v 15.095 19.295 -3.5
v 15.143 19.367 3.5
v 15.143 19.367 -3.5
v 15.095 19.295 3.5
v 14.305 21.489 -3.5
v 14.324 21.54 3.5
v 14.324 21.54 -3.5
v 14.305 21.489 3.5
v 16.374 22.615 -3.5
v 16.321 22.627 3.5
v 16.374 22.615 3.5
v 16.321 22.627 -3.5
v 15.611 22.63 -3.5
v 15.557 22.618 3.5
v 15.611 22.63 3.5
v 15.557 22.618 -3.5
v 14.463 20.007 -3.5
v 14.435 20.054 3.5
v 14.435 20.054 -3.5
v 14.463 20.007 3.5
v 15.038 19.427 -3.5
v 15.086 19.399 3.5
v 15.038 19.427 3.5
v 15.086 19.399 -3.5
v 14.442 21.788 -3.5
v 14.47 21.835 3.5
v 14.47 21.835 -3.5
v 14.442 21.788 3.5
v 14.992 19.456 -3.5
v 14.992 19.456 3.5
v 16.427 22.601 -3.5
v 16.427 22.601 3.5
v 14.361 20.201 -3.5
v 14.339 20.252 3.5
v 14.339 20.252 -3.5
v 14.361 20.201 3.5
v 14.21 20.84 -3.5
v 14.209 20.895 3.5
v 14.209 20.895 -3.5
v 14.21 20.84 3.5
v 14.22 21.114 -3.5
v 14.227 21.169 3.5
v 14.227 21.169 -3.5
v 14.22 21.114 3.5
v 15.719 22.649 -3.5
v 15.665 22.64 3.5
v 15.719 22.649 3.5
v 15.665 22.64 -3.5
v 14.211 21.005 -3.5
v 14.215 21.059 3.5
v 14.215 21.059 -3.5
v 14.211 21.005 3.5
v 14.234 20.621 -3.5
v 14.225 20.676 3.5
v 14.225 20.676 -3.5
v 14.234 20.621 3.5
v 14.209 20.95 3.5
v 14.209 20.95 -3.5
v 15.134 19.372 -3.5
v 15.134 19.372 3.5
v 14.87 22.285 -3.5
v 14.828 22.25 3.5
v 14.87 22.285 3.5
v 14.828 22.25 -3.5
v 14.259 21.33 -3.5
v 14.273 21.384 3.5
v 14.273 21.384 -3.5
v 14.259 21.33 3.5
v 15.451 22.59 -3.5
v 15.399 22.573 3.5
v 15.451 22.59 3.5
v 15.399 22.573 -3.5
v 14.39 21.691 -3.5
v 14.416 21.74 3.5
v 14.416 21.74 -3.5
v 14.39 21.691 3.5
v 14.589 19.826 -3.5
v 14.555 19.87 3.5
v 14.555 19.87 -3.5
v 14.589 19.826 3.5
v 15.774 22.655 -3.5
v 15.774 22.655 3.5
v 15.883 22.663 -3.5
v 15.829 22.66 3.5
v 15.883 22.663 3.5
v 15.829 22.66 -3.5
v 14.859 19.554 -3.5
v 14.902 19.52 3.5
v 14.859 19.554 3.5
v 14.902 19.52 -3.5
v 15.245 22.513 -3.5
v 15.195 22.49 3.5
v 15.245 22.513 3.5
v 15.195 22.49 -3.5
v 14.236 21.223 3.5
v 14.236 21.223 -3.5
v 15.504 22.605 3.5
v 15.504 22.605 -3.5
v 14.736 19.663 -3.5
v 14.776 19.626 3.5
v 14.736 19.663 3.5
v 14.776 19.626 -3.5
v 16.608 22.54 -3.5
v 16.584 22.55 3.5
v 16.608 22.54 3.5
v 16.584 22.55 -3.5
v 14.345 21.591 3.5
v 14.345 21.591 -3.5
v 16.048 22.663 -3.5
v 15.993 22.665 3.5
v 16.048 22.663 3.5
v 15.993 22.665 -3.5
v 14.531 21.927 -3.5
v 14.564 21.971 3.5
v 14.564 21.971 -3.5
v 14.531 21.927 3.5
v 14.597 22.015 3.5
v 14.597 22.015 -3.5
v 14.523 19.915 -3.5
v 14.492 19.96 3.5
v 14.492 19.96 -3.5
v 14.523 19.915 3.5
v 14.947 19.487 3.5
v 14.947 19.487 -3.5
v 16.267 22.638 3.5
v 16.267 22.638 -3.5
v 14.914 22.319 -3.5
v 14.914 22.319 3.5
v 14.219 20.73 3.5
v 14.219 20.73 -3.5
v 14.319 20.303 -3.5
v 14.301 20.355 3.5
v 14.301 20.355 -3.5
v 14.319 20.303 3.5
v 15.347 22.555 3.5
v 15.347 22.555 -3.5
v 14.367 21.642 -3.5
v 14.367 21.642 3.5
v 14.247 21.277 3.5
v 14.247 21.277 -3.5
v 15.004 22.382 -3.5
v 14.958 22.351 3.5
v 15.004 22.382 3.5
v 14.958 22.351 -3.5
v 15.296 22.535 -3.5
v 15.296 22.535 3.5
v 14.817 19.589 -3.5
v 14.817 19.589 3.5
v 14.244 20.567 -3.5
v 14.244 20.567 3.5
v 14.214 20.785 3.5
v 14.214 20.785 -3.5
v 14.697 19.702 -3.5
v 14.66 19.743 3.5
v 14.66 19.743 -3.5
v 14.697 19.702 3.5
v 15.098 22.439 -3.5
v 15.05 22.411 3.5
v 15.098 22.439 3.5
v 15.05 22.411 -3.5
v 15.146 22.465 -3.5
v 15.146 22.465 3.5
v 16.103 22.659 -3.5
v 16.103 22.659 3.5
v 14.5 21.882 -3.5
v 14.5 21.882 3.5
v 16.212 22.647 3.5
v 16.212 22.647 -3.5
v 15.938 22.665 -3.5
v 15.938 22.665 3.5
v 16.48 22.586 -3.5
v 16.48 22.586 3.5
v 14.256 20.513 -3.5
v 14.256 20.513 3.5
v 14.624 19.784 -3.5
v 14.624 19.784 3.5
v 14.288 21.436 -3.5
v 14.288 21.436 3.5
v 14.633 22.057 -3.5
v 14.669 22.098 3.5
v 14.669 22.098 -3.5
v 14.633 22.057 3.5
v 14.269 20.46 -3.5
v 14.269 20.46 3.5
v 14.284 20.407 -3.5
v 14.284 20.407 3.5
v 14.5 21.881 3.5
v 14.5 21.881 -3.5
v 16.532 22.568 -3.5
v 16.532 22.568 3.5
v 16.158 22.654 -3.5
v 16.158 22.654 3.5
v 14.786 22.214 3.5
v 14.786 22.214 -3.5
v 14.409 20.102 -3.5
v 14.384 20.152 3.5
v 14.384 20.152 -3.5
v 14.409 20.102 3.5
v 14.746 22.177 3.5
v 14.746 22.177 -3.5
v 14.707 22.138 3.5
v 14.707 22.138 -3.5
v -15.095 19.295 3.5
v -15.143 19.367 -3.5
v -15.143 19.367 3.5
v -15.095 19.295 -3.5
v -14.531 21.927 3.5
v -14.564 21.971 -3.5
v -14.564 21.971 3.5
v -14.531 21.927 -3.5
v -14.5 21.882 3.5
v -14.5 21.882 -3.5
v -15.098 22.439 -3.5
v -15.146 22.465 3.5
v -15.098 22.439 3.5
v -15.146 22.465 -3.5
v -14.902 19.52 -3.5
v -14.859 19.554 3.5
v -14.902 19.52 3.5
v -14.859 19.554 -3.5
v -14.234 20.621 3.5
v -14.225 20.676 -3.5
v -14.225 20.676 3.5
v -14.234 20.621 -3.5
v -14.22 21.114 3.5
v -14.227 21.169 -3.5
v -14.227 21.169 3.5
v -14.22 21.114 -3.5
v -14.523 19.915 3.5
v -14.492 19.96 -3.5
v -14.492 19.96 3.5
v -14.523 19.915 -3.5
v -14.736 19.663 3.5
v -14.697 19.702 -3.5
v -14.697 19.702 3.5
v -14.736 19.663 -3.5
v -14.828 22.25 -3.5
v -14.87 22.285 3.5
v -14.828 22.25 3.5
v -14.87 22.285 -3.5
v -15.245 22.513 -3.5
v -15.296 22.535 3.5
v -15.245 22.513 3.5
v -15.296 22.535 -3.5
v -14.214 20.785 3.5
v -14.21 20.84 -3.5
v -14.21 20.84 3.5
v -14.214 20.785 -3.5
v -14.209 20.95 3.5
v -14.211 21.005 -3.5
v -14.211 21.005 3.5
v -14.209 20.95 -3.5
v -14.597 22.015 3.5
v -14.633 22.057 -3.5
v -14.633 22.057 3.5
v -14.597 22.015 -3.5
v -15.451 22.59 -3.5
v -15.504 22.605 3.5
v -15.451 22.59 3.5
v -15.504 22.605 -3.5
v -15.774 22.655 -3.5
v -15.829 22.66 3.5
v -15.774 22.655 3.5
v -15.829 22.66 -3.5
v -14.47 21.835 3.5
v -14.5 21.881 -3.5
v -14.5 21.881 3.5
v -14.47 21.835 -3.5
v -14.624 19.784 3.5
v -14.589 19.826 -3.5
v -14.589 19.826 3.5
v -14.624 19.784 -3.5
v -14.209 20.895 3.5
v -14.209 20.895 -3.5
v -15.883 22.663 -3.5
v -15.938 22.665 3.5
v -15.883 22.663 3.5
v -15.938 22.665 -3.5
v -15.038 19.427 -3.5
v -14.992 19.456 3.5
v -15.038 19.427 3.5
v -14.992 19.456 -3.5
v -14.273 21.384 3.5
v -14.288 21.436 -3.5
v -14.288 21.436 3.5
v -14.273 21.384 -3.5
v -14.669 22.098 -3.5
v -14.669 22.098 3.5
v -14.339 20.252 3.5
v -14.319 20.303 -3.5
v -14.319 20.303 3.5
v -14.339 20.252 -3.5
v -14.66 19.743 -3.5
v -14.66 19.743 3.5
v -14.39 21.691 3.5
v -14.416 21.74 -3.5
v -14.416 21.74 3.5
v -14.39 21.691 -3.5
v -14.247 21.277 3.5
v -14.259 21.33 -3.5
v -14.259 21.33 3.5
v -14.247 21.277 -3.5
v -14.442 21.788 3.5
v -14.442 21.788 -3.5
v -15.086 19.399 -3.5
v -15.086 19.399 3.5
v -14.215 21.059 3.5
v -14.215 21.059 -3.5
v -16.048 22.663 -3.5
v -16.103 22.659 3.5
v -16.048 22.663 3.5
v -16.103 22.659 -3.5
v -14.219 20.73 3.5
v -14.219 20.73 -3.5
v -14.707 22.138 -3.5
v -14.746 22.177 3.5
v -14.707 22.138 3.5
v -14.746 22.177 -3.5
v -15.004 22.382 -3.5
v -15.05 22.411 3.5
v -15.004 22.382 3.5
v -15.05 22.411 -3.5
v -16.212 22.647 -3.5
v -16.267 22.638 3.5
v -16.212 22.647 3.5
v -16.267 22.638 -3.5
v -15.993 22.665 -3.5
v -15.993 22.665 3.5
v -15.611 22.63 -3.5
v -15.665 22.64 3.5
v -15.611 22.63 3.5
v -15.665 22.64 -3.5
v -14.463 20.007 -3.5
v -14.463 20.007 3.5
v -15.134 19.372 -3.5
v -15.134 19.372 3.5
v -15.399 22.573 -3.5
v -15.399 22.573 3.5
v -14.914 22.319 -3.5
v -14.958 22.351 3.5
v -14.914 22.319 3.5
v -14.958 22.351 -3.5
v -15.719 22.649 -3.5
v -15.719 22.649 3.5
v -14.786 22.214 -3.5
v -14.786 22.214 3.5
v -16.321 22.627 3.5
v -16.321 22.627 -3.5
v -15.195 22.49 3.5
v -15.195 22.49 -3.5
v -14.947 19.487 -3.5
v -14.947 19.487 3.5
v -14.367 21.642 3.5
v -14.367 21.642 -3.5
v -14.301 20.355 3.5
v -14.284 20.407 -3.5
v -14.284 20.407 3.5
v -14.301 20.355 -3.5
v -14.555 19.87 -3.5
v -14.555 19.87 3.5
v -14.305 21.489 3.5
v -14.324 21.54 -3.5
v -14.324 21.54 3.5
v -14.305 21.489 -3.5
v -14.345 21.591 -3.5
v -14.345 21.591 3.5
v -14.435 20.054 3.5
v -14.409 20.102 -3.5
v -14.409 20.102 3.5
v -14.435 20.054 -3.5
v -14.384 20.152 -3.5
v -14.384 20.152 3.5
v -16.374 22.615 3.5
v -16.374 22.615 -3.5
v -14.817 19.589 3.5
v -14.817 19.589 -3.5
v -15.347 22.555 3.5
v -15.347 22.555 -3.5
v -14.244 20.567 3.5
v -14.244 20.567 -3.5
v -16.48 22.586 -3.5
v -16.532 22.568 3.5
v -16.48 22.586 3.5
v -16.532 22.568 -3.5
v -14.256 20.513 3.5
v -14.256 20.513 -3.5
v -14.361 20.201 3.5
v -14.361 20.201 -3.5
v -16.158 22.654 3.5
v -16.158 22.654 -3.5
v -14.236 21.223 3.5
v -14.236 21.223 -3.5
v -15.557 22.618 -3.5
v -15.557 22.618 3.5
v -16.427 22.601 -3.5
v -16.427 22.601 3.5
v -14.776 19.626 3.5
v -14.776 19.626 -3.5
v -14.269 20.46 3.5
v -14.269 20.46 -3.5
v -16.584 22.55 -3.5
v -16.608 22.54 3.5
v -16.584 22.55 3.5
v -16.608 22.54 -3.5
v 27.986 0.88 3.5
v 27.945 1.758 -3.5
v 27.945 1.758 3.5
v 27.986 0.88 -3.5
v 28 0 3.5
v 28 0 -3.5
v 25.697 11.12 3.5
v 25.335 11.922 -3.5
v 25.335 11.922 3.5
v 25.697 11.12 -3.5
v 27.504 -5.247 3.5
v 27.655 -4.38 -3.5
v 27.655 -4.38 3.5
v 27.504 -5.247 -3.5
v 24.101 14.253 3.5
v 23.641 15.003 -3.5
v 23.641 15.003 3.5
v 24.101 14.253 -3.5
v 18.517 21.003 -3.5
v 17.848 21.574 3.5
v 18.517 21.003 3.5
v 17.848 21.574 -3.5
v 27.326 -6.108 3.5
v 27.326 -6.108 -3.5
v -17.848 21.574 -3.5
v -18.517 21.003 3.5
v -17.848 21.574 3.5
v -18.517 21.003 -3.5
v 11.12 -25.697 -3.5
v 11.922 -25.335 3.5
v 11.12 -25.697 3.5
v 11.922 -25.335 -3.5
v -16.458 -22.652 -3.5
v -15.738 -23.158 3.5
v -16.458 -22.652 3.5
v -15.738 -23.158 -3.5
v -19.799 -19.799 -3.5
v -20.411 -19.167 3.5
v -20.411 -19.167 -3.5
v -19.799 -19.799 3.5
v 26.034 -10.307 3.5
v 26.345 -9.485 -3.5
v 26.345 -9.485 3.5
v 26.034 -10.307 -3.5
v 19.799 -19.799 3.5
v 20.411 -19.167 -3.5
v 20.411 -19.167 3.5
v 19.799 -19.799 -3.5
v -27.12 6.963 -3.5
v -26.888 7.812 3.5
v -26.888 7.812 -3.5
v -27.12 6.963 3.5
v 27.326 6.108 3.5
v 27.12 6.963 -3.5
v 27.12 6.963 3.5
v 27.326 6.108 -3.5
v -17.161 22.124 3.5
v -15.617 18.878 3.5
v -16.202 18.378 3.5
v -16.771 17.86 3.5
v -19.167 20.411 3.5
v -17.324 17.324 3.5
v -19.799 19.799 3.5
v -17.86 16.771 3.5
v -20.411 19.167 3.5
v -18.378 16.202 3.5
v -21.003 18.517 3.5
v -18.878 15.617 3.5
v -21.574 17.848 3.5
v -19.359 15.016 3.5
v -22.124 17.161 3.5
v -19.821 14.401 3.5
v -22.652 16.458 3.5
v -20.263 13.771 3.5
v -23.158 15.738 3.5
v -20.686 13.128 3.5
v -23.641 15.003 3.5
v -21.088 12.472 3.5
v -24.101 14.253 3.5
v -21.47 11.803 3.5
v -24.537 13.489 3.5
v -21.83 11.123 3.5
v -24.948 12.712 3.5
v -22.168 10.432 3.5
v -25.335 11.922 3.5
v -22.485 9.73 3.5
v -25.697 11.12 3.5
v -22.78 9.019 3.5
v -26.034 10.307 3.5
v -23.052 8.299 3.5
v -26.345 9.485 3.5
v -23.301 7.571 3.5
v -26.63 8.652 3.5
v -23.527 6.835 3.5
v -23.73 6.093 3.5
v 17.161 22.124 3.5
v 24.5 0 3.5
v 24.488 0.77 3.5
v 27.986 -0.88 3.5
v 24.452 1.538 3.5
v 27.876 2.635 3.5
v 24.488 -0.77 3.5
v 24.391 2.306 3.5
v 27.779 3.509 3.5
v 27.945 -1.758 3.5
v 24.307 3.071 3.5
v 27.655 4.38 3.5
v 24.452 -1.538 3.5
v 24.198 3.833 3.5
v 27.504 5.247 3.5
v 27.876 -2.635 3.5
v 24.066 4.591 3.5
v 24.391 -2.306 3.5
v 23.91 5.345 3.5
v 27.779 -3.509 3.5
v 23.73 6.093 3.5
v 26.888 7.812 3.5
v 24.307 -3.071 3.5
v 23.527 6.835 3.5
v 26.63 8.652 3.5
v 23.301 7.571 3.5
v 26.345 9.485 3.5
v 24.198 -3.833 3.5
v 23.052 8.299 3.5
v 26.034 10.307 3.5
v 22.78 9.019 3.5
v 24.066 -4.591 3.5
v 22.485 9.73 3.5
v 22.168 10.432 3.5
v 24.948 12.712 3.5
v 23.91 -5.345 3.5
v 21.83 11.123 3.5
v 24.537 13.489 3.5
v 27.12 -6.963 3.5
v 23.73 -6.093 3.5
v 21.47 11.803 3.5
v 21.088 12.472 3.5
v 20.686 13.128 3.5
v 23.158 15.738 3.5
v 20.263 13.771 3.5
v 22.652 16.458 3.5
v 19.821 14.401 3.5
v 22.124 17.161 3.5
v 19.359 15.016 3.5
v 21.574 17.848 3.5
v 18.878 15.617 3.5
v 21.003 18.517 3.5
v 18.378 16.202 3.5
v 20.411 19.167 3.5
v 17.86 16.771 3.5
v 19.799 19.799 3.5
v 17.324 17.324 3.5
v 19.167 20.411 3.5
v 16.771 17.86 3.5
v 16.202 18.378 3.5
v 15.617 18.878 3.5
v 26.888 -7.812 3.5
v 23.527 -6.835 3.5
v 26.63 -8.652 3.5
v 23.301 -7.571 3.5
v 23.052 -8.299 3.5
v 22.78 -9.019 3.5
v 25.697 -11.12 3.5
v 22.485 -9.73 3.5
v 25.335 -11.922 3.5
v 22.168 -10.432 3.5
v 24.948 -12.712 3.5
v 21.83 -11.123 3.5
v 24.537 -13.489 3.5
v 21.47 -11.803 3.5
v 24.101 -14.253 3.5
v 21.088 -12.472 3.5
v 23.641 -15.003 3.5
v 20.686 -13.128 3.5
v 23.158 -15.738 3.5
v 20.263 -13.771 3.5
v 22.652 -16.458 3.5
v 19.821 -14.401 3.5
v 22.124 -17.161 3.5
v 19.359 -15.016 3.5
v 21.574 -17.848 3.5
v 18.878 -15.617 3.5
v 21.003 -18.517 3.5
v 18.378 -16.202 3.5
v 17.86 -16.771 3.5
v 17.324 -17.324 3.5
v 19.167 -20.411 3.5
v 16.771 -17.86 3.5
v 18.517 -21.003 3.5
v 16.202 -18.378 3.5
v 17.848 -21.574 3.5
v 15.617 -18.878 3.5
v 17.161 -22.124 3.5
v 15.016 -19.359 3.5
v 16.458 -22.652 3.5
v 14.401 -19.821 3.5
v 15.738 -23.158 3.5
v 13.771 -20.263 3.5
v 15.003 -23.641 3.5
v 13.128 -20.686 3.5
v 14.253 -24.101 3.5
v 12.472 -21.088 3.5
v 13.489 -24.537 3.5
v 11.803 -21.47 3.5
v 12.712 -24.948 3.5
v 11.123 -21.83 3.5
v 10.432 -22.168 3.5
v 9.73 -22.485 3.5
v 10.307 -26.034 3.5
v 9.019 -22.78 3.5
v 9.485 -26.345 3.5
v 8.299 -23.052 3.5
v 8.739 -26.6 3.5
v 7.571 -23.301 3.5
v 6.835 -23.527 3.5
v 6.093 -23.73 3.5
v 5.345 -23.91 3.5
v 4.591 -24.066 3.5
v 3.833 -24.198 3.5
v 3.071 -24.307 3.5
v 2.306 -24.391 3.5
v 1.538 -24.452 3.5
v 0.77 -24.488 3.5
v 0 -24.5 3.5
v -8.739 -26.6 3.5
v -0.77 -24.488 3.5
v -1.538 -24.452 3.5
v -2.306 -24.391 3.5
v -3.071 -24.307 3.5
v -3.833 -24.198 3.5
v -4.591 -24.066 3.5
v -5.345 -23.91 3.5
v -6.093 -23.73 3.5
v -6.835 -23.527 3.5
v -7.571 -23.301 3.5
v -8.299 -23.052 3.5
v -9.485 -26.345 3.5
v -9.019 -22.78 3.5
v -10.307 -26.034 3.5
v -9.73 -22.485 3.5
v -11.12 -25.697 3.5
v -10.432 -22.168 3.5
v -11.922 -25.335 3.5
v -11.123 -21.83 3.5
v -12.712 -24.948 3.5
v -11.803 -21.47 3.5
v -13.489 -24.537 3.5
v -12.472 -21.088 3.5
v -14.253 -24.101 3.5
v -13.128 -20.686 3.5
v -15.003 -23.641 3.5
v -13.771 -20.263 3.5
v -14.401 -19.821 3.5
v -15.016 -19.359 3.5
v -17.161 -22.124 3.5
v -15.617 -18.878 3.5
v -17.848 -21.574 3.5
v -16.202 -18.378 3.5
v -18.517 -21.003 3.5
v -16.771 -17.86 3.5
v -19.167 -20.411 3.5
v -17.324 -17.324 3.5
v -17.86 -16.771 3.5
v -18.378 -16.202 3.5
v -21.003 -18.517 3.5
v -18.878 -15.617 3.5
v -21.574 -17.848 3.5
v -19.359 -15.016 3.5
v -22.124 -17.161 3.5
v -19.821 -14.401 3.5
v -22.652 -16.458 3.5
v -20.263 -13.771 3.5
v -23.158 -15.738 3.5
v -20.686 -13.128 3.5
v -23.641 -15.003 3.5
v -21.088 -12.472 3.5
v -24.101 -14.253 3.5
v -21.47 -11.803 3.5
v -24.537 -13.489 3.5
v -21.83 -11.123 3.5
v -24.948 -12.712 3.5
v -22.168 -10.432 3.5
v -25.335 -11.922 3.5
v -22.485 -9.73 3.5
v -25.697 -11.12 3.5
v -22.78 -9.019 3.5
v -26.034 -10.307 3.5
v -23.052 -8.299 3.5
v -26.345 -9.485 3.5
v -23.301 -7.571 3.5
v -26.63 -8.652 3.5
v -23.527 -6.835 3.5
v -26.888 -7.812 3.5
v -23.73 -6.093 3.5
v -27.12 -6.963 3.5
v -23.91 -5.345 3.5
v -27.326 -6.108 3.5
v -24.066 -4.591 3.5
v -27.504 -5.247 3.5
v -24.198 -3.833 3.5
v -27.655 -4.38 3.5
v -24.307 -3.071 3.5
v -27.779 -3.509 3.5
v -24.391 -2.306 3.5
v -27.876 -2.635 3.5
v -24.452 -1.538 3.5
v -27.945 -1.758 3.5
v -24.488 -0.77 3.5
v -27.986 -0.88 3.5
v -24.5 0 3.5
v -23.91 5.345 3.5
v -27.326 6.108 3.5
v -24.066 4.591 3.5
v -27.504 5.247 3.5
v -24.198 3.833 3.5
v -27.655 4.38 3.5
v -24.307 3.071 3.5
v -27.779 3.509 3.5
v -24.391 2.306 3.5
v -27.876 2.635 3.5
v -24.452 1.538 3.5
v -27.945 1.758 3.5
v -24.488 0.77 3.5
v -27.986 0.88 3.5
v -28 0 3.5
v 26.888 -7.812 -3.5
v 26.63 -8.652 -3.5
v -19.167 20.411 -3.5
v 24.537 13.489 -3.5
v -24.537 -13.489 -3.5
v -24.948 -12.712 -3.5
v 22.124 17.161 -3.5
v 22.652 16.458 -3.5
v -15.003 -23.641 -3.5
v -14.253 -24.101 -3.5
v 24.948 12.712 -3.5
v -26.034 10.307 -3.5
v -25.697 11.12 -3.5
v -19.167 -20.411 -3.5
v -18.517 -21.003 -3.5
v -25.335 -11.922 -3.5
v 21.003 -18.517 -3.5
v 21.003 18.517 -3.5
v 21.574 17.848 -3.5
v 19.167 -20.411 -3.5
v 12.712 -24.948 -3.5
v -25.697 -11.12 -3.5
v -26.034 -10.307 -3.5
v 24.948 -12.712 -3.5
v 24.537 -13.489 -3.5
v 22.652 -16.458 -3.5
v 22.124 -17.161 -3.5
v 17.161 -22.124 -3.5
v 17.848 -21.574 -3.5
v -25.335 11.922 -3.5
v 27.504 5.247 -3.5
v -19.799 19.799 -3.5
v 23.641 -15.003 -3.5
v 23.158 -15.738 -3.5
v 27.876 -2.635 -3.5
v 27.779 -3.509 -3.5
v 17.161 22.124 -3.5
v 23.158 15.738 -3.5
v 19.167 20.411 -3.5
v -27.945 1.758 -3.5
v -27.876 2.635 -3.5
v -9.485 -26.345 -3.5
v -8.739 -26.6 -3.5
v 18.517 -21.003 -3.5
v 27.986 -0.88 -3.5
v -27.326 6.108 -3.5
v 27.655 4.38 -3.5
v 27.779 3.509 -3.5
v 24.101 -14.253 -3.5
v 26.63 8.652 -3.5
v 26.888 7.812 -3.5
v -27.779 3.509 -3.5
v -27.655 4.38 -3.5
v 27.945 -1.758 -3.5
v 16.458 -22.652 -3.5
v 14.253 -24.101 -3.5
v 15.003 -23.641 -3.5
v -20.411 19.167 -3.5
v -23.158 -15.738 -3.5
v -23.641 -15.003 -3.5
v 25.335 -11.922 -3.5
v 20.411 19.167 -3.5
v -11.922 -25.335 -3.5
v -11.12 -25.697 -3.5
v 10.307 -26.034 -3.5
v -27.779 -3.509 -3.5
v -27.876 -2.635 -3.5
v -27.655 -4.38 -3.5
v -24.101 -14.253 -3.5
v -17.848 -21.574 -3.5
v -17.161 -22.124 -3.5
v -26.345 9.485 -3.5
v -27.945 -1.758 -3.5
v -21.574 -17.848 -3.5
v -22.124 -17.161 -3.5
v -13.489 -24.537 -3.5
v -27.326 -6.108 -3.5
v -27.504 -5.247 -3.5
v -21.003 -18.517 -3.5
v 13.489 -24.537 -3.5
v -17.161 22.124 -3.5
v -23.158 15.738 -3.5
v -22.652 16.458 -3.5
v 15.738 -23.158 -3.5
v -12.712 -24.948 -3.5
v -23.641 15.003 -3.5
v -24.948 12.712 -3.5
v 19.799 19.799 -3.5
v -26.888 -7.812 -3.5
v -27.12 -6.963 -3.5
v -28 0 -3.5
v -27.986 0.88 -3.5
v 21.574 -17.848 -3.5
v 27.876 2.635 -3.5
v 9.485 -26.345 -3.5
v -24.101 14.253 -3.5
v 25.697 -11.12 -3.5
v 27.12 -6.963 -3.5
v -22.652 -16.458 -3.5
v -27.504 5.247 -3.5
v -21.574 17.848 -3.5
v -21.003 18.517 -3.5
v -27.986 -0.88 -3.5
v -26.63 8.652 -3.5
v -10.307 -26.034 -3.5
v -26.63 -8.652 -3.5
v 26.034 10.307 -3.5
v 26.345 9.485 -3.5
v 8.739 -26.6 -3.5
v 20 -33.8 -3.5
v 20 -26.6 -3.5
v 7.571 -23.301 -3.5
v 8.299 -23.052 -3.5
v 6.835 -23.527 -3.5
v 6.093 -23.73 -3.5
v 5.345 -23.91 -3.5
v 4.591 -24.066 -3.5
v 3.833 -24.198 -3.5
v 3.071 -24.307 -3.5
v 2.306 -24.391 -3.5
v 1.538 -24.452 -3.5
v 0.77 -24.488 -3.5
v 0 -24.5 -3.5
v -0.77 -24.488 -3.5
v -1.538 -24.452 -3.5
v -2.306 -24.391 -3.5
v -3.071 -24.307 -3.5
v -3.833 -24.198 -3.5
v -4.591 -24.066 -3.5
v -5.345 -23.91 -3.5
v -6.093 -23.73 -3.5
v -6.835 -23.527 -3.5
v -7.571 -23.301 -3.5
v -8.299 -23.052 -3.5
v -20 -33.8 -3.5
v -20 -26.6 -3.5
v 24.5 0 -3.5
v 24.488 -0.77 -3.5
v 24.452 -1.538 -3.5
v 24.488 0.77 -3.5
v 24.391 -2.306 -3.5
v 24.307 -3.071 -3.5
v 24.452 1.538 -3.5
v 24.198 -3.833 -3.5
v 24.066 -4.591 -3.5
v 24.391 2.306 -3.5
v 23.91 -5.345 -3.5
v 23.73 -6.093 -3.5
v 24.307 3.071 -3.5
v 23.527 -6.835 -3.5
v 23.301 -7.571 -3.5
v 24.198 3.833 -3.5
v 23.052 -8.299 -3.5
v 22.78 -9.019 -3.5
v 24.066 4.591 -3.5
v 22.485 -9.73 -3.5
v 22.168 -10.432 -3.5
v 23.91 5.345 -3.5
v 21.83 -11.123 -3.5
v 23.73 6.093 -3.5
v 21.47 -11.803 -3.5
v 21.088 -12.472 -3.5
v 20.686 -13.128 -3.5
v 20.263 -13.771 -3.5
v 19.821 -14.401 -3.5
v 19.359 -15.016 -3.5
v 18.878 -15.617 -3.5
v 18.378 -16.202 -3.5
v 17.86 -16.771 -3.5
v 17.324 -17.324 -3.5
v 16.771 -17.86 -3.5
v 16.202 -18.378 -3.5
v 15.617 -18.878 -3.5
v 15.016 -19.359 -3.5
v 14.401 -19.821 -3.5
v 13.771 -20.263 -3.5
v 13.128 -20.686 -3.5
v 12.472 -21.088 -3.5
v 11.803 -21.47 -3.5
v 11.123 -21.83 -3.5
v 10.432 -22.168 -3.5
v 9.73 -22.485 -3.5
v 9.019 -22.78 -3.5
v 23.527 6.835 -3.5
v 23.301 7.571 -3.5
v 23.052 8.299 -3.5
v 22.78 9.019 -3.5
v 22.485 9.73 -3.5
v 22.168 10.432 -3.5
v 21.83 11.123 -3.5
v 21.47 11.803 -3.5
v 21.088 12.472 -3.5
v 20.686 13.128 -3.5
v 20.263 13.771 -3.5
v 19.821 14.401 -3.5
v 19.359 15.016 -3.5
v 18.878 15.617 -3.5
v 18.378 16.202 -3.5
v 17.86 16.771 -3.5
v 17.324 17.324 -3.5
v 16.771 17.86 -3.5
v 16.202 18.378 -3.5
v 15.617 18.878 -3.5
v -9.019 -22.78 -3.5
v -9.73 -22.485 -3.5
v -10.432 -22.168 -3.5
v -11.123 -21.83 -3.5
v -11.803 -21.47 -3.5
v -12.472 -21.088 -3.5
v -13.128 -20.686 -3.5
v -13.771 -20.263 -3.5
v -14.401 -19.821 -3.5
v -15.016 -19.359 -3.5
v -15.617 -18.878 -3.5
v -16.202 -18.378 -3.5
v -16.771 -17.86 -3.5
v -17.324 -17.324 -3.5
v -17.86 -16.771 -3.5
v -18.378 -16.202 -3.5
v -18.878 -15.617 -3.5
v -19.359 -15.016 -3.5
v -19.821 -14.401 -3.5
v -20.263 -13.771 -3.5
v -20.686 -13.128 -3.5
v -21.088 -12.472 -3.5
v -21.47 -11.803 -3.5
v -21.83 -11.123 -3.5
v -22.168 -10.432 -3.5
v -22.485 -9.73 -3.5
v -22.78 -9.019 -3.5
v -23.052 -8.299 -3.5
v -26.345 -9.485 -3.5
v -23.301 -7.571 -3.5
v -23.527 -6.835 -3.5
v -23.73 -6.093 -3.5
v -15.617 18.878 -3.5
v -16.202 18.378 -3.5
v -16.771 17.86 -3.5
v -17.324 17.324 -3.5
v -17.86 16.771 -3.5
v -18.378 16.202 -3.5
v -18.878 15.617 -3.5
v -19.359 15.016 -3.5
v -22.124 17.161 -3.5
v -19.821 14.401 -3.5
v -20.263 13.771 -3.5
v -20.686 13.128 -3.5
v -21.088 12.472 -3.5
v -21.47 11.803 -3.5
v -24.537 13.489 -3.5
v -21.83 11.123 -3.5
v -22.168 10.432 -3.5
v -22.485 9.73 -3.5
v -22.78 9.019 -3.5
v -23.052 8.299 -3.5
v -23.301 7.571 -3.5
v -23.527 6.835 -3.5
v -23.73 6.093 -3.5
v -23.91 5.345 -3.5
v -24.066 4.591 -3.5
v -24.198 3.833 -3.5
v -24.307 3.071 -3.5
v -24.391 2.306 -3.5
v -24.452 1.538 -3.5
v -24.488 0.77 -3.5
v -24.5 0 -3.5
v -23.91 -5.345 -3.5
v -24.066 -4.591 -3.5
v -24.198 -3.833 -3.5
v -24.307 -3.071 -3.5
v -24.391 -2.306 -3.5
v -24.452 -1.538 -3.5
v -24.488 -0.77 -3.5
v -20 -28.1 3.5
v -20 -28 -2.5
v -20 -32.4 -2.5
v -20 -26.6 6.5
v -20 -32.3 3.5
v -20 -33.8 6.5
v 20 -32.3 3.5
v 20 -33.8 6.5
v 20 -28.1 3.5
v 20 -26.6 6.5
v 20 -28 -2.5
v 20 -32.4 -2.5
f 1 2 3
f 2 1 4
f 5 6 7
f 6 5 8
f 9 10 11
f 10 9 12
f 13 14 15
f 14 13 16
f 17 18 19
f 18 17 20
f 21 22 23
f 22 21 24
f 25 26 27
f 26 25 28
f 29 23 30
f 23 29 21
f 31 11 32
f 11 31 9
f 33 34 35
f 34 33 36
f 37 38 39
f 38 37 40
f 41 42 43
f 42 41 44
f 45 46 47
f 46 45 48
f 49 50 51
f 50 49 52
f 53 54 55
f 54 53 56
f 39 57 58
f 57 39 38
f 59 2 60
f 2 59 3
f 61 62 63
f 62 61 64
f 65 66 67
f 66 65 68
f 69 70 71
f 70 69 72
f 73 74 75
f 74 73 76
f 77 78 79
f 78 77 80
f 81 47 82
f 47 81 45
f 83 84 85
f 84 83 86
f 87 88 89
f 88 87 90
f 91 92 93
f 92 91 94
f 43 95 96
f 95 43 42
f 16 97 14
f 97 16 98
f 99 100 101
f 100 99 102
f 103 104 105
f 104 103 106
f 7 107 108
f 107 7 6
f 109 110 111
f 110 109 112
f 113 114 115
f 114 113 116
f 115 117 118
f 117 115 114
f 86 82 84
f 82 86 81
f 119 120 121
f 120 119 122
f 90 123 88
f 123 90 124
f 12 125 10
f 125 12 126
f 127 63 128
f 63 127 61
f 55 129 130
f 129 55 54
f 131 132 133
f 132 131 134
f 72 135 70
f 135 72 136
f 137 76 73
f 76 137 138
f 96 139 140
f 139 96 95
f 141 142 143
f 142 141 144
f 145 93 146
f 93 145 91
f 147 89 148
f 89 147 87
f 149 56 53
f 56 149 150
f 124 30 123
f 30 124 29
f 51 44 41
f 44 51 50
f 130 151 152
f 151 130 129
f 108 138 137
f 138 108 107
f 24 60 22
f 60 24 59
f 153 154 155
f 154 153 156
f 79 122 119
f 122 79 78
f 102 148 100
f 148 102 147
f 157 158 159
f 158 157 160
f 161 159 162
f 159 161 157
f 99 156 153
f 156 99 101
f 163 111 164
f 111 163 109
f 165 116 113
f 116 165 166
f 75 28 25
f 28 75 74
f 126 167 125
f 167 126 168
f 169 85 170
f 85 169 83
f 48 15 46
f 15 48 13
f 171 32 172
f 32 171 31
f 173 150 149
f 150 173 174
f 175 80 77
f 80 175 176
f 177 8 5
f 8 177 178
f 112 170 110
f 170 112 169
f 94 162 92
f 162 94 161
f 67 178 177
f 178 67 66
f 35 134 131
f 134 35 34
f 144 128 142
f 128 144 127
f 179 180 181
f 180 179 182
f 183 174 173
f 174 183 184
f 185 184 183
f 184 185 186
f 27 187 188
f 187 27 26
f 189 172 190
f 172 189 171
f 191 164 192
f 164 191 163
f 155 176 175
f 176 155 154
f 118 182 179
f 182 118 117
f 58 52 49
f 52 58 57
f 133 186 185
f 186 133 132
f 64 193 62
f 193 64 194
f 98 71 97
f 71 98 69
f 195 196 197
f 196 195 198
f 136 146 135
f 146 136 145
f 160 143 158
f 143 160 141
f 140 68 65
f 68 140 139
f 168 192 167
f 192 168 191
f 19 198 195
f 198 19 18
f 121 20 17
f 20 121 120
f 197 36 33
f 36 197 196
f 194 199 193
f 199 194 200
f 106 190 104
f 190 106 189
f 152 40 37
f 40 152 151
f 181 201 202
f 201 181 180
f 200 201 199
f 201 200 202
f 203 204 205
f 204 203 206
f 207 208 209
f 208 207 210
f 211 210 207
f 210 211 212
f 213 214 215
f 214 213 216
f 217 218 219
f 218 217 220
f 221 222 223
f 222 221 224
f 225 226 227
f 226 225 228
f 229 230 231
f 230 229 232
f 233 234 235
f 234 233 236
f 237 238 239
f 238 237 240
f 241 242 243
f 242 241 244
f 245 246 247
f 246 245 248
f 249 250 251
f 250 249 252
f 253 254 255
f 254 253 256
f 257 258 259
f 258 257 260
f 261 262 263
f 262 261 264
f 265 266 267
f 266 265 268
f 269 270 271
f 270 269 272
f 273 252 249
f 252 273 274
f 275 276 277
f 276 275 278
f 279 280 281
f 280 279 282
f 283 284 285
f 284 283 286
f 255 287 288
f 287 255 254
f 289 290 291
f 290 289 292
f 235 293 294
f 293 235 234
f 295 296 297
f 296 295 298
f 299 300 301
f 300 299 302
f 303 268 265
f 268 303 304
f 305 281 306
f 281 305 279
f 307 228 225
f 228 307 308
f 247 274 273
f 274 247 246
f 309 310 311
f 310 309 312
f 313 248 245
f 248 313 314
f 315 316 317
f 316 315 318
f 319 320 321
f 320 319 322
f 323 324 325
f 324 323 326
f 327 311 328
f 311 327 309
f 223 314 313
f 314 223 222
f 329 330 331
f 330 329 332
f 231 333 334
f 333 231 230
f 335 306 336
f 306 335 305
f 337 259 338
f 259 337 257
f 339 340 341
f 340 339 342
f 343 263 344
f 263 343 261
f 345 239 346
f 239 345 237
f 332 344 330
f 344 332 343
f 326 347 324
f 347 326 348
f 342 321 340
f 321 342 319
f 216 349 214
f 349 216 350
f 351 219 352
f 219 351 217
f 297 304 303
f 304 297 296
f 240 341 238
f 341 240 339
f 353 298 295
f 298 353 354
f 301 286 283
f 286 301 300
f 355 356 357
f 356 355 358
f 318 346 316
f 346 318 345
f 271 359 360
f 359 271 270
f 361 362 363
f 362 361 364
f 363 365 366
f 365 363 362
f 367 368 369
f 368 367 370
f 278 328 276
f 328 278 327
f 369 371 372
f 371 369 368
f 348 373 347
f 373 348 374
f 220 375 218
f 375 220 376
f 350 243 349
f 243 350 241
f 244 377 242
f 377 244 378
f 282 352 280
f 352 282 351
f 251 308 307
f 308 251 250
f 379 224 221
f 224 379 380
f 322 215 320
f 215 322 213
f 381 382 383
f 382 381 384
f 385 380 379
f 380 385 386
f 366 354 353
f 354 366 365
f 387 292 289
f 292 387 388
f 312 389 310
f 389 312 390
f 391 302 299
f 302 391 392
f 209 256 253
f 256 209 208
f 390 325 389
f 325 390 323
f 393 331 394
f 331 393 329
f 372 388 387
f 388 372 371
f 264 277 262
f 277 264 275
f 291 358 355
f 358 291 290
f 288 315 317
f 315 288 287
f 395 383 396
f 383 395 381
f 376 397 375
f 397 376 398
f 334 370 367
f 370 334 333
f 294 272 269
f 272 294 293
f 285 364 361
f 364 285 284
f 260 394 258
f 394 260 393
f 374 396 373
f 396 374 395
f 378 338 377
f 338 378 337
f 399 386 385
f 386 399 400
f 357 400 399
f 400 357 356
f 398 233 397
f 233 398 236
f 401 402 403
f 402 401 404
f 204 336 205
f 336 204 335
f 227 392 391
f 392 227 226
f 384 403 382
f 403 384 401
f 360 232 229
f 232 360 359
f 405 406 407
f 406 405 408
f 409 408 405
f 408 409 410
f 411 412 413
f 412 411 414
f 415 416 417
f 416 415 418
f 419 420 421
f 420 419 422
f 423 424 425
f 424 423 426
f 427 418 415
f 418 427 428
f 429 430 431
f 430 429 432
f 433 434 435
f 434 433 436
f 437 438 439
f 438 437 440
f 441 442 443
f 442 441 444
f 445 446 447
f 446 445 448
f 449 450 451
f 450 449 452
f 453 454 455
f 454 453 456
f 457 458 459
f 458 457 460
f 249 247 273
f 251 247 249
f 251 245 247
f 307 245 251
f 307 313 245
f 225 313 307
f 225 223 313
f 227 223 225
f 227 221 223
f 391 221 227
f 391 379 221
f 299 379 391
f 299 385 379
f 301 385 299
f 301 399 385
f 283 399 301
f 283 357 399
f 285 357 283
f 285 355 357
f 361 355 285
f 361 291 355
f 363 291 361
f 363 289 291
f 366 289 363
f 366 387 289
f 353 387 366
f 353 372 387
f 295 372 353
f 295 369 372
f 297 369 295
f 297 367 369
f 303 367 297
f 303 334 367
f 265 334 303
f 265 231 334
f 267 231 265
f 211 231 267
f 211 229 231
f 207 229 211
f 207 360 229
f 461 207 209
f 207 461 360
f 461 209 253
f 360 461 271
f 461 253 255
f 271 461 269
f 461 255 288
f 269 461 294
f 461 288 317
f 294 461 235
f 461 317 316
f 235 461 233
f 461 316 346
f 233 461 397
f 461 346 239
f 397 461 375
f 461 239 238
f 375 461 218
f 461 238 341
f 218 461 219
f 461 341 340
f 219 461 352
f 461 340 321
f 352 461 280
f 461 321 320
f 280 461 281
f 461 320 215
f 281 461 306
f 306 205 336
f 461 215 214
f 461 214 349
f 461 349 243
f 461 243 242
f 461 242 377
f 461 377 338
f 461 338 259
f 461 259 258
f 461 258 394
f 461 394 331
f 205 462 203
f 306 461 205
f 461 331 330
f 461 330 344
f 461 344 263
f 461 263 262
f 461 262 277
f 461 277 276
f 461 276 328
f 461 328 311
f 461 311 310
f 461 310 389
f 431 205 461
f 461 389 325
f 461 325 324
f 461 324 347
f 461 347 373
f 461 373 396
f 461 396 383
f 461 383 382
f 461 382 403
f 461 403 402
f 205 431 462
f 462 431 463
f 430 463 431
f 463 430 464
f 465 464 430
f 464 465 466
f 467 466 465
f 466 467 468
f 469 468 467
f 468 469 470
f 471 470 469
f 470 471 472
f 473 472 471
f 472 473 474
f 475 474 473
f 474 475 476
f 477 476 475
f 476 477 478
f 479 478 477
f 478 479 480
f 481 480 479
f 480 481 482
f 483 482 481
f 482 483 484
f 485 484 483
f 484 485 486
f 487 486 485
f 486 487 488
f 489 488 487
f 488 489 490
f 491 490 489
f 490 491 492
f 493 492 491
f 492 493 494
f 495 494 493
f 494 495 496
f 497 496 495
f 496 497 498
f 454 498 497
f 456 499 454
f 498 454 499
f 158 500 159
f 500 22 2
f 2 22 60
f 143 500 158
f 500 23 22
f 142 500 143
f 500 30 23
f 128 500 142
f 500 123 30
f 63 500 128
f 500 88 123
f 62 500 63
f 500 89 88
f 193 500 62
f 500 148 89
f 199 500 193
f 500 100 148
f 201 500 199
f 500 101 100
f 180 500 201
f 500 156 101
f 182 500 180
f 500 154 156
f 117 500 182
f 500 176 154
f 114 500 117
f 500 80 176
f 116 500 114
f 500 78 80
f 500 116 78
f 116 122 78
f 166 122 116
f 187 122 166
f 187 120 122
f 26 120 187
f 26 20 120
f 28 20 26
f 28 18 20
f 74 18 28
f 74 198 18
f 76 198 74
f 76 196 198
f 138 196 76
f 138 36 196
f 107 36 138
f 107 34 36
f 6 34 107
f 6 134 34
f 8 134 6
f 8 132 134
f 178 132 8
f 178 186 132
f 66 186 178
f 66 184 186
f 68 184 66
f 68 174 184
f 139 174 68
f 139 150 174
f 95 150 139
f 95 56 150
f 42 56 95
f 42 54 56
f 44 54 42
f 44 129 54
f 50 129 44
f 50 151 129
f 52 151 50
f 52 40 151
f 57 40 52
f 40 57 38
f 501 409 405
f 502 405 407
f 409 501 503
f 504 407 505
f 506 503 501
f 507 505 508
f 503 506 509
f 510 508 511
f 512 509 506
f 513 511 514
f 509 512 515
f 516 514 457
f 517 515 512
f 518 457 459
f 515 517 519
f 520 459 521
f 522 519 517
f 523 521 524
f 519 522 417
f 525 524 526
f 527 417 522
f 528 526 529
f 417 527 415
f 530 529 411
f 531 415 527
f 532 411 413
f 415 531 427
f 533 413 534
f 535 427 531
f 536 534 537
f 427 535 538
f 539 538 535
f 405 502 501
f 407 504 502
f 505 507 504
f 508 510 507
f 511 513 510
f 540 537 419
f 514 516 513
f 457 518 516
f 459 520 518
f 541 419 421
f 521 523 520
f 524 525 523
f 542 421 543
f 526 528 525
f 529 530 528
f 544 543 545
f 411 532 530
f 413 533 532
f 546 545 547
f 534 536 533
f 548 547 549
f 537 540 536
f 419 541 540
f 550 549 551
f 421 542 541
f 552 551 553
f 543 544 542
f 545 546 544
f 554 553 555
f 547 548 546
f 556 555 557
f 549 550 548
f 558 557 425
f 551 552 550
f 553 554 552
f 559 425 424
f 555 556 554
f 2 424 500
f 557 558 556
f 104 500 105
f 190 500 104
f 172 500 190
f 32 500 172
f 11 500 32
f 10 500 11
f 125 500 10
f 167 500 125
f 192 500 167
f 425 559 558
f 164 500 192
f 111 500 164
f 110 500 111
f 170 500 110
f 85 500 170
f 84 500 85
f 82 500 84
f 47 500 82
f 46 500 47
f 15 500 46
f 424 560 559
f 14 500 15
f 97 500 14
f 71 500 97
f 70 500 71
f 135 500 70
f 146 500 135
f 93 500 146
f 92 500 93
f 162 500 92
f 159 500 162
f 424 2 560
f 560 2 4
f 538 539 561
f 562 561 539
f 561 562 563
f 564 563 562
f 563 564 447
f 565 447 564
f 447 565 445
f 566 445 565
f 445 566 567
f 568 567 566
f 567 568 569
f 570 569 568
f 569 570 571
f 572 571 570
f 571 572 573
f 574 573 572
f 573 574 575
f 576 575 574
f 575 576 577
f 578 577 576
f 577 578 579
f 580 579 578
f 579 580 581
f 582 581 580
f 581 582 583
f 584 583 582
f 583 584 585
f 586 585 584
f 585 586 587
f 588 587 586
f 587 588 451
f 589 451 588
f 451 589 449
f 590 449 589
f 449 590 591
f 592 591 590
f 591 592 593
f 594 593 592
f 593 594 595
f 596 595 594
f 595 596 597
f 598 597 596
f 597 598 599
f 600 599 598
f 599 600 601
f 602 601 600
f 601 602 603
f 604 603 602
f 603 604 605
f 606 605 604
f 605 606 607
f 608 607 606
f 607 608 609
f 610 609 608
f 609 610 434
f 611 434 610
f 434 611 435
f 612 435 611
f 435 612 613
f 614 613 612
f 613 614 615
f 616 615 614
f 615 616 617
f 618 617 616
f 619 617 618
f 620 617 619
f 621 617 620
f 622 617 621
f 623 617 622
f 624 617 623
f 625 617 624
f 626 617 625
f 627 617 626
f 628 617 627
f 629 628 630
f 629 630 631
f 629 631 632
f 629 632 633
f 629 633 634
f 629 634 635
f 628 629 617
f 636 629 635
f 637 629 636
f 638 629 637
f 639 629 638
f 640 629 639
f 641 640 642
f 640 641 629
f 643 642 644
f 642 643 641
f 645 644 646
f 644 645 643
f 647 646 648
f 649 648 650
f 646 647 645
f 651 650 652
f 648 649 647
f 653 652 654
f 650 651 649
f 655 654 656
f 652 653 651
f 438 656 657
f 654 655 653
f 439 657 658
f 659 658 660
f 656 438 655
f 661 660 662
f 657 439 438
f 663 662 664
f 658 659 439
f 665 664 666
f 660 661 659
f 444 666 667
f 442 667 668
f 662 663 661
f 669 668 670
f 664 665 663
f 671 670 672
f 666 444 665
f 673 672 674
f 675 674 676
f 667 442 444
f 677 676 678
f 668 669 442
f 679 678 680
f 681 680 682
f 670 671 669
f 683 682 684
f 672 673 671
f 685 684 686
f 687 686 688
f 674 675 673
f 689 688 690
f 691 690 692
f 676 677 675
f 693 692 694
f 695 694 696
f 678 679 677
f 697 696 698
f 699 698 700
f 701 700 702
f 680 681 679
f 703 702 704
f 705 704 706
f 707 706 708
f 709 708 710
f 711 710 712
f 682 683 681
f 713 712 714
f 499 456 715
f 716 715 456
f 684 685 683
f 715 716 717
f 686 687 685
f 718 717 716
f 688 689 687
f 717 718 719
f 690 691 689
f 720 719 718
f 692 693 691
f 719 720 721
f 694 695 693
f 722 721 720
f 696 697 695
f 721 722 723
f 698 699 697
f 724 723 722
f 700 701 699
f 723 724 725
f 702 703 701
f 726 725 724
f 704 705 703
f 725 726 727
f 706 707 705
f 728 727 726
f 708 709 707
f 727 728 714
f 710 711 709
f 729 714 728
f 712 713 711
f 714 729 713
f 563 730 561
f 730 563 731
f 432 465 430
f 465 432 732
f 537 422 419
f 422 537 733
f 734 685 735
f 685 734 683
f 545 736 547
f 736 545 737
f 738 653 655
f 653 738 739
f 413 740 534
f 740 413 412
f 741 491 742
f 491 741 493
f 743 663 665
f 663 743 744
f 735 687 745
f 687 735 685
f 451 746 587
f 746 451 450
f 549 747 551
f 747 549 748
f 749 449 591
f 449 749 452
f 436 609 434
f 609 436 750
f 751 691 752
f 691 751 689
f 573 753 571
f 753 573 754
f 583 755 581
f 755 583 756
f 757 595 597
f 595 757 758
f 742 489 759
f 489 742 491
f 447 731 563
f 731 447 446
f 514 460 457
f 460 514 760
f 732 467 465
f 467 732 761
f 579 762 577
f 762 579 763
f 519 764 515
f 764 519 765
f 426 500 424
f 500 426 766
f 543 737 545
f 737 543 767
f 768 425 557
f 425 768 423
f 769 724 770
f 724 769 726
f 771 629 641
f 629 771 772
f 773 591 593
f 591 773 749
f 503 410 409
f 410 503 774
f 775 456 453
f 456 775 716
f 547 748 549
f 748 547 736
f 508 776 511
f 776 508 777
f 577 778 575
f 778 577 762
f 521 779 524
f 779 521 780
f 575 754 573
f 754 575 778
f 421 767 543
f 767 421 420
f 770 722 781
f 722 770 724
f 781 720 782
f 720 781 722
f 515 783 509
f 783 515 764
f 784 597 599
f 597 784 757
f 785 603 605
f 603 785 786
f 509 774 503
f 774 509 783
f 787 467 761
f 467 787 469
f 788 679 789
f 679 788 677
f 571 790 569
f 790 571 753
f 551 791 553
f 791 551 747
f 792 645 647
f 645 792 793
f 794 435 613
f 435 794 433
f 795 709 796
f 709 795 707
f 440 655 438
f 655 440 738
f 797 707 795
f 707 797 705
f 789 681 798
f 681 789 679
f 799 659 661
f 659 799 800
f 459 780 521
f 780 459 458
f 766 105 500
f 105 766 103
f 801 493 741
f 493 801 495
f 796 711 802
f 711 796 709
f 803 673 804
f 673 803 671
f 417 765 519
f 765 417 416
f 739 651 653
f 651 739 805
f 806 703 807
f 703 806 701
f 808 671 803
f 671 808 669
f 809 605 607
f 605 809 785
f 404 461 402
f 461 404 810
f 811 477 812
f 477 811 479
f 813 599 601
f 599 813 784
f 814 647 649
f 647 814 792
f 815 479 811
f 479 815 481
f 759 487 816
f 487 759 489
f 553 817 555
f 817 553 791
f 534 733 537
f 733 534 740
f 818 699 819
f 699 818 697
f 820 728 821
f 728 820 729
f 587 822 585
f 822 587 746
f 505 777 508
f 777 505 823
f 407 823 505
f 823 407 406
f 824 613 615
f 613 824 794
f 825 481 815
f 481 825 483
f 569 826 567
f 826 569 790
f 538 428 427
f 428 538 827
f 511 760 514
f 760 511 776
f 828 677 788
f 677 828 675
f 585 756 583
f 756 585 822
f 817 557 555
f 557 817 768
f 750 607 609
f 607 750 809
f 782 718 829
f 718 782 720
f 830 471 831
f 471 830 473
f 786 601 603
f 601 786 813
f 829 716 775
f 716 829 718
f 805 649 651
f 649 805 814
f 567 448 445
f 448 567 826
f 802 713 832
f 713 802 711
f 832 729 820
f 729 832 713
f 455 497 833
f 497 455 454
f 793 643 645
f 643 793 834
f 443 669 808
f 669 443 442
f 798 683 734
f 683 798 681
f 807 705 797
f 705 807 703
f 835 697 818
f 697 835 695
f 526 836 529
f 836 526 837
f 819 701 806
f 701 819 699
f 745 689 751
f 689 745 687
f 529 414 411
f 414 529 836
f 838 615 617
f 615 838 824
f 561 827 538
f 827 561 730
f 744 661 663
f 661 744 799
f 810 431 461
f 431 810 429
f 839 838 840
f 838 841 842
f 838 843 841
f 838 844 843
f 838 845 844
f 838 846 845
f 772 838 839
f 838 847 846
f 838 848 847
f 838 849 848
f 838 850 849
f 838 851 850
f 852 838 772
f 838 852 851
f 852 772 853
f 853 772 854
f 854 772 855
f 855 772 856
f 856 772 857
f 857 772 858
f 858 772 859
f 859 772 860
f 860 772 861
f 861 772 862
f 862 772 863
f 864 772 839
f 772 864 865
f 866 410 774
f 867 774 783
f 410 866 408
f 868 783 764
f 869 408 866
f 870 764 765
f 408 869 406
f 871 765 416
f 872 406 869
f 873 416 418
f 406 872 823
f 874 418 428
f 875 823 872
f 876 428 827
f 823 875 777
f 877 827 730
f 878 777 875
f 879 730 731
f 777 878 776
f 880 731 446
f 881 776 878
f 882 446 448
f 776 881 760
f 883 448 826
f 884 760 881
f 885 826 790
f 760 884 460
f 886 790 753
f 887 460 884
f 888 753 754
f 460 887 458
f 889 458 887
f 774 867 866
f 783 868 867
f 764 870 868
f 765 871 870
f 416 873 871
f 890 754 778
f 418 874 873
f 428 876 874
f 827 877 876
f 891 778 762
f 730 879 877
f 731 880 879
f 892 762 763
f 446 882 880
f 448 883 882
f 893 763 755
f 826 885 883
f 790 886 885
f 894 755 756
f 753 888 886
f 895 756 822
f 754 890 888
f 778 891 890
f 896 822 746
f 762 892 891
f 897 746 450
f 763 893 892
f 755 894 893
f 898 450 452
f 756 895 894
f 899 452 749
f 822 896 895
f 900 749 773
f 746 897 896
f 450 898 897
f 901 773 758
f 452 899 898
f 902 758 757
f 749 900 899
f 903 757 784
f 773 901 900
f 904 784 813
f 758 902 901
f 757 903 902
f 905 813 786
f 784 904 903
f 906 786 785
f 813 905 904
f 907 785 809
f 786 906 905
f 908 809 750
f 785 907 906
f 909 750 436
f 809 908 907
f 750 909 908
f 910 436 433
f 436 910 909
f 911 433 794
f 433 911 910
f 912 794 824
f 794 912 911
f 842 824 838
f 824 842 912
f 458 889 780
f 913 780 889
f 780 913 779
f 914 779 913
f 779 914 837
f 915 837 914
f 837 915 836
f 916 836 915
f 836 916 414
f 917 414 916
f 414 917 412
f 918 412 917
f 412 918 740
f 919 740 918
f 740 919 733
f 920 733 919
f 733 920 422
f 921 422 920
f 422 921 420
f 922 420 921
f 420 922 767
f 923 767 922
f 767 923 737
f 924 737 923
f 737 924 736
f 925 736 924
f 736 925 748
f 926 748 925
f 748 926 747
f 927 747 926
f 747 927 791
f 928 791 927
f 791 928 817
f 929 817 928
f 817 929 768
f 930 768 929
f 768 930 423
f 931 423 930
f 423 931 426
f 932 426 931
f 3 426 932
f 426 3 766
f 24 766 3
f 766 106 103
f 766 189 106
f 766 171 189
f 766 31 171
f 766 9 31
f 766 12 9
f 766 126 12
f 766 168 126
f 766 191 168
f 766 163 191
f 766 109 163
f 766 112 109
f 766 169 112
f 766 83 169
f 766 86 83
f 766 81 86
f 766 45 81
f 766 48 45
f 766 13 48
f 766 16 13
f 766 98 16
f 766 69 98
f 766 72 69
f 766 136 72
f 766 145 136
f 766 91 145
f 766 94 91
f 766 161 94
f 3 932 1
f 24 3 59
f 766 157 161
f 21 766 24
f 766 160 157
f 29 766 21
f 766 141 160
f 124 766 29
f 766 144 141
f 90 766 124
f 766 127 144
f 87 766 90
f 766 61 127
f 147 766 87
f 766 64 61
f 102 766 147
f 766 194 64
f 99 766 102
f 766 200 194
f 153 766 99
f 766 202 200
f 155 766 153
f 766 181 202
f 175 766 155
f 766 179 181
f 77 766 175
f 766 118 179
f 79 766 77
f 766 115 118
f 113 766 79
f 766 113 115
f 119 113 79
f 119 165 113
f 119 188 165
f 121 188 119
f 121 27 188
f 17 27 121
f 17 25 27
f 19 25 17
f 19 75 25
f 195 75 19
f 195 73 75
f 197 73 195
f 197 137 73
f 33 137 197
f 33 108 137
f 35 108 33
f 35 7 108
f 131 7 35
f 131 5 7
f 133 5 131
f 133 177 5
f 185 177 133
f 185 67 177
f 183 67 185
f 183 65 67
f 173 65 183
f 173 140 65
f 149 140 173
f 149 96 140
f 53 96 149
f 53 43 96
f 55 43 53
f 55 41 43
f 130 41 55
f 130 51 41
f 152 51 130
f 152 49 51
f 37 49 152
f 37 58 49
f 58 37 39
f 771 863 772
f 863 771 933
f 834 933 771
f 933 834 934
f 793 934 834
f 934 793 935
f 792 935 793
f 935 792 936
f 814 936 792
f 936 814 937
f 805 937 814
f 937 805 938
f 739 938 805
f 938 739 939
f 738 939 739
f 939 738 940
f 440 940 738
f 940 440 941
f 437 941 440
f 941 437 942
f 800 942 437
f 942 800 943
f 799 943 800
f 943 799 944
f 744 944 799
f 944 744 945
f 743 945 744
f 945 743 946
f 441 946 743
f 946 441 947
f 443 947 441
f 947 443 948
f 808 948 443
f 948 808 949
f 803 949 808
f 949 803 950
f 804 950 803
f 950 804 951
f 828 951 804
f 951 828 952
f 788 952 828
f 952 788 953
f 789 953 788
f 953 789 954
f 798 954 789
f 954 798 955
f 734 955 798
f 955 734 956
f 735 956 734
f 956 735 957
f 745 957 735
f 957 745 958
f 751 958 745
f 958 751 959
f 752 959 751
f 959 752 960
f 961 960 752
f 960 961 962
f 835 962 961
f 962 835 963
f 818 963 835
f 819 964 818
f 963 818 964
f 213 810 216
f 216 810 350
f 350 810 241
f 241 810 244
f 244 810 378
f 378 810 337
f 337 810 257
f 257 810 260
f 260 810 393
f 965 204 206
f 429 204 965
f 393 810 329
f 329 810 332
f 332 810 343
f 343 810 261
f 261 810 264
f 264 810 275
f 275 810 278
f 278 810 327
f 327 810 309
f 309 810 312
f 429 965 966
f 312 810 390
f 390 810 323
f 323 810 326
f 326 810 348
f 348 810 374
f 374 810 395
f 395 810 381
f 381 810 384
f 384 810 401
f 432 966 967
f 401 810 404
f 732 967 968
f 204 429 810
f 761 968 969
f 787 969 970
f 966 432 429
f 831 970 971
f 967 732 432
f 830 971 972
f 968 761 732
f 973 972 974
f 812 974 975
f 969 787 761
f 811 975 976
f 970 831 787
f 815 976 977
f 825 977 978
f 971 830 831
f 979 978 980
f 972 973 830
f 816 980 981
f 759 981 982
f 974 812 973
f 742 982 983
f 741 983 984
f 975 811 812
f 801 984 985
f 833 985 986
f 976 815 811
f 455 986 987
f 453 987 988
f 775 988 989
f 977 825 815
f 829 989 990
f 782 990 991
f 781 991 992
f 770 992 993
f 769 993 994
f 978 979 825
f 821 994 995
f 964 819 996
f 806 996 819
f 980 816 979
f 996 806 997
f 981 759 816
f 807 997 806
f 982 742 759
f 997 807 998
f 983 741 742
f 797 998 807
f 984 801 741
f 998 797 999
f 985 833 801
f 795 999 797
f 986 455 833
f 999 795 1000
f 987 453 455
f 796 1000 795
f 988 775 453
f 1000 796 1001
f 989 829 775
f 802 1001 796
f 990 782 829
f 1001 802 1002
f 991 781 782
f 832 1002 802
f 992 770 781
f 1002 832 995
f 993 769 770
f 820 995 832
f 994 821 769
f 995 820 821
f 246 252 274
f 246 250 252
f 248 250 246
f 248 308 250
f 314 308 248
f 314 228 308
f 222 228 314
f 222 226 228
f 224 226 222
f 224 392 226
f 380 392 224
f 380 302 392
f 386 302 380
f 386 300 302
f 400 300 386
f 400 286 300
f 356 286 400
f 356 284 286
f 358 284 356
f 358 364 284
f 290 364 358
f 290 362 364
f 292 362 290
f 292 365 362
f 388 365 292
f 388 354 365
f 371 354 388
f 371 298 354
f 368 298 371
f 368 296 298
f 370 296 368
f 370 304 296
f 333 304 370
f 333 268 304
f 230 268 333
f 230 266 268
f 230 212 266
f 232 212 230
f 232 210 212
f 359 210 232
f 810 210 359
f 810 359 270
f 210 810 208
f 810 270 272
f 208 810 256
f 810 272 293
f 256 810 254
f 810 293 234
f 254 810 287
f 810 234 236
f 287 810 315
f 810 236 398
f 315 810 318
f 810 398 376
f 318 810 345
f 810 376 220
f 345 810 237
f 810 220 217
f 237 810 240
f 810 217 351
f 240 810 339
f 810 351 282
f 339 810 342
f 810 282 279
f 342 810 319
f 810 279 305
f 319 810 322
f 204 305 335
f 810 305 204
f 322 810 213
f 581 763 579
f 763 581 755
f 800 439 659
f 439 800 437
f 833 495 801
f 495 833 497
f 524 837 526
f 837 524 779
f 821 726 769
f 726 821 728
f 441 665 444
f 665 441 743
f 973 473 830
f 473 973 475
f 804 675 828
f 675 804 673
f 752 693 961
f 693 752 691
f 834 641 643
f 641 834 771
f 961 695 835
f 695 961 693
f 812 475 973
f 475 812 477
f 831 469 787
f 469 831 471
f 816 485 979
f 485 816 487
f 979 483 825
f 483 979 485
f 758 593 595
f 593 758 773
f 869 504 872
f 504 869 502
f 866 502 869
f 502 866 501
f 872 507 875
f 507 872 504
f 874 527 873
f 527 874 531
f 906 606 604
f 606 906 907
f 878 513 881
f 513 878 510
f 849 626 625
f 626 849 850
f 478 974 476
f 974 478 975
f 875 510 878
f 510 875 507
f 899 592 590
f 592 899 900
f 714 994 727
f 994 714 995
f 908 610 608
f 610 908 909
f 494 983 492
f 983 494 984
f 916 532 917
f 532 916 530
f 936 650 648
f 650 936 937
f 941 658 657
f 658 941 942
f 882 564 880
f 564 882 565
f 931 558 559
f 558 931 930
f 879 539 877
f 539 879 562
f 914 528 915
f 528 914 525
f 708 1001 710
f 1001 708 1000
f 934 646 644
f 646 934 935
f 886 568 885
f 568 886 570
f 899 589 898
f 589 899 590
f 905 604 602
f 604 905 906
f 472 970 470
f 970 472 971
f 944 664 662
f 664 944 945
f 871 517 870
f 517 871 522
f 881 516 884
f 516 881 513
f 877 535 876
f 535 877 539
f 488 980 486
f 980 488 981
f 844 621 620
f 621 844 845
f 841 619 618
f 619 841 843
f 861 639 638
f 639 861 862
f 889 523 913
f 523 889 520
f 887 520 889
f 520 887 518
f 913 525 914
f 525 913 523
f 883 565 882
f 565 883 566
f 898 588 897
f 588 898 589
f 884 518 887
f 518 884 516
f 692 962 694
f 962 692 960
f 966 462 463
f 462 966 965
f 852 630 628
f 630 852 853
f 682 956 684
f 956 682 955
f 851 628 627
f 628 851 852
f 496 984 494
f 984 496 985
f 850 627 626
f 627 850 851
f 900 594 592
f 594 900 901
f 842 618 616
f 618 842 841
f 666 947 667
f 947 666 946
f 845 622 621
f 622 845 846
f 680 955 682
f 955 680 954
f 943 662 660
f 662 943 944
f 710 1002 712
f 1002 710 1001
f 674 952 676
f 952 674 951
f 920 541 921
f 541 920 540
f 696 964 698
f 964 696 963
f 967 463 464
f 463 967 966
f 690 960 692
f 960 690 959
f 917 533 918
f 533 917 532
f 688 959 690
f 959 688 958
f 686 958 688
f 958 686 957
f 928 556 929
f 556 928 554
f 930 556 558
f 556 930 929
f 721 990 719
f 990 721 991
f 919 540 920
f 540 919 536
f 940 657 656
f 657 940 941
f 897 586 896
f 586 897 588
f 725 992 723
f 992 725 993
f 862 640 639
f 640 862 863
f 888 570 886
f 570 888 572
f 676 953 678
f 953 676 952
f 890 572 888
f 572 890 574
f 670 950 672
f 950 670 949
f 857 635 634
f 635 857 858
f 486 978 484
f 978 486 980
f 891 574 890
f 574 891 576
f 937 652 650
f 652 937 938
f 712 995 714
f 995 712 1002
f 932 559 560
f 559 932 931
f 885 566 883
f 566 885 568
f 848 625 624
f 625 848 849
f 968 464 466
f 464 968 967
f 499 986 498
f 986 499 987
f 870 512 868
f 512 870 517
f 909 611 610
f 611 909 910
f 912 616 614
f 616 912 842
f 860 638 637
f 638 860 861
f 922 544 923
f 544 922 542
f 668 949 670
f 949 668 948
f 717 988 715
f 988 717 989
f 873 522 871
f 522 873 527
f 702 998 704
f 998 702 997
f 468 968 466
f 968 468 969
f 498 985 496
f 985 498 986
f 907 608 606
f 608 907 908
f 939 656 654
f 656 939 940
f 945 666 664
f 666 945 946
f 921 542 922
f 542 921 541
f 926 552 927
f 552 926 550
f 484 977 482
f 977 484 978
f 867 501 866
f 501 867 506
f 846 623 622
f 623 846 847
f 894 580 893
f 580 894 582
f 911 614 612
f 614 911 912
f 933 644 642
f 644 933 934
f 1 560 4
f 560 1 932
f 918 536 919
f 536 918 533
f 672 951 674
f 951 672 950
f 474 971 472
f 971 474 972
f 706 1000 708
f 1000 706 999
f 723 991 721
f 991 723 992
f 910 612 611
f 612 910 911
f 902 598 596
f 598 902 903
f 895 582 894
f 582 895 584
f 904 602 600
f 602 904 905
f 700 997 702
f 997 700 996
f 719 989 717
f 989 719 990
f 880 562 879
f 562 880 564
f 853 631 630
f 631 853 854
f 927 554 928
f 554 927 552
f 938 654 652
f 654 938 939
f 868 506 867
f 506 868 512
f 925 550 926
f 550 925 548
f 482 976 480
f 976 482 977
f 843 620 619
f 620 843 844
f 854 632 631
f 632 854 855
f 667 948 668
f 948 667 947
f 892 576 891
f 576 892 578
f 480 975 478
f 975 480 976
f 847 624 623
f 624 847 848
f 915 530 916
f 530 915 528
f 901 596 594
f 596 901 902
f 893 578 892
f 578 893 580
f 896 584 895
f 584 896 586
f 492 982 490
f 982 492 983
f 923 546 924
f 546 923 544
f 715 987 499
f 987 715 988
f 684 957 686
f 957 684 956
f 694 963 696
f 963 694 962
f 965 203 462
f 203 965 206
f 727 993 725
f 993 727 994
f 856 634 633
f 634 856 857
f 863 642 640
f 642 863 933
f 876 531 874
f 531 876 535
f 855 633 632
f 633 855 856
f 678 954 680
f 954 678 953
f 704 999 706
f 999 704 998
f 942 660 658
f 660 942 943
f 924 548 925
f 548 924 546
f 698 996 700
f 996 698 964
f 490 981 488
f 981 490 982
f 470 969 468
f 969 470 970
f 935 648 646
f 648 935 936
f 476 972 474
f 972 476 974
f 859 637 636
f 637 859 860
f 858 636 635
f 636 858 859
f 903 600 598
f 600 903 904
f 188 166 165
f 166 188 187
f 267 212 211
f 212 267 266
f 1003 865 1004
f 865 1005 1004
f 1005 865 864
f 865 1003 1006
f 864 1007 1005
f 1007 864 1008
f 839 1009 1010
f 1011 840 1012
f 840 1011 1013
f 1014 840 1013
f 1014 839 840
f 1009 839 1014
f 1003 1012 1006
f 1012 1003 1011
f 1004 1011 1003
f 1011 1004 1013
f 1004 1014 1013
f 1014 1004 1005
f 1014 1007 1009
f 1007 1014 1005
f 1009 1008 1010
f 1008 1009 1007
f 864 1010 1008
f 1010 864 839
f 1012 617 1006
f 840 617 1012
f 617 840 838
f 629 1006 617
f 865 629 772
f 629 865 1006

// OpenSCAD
// Connector to hold a thin plywood panel in place at a stairway that
// has round legs as connections between each pair of stairs.
// The connector can be snapped onto the legs.


$fn = 200;  // Number of fragments used to construct curves and circles

module drawRing()
{
    // Dimensions of ring
    inner_diameter = 49.0;
    inner_radius = inner_diameter/2;
    thickness = 3.5;
    outer_radius = inner_radius + thickness;
    height = 2.0*thickness;

    // Ring opening
    ring_middle = inner_radius+thickness/2;
    opening_cutter_y = inner_radius-10;
    opening_cutter_x = sqrt( ring_middle^2 - opening_cutter_y^2);
    opening_cutter_rotation = asin(opening_cutter_y/ring_middle);
    
    // panel holder
    holder_thickness = 1.5;
    holder_thickness_bottom = 1.0;
    panel_thickness = 4.2;
    panel_thickness_bottom = 4.4;
    panel_holder_width = 40;
    panel_holder_height = 10;
    panel_holder_thickness = panel_thickness + 2*holder_thickness;
    
    // other values
    tolerance = 0.1;
    tolerance1 = 1+tolerance;

    // whole object
    union() {
        // holding ring
        difference() {
            union() {
                cylinder(h = height, r = outer_radius, center=true);
            }
            cylinder(h = height + 2*tolerance, r = outer_radius - thickness, center=true);
            // snap cutout
            translate([opening_cutter_y, opening_cutter_x, 0]) {
                rotate([0, 0, -opening_cutter_rotation]) {
                    difference() {
                        dim = tolerance1*thickness;
                        cube([dim, dim, tolerance1*height], center = true);
                        translate([thickness/2, 0, 0]) {
                            cylinder(h=tolerance1*height, r=thickness/2, center=true);
                        }
                    }
                }
            }
            translate([-opening_cutter_y, opening_cutter_x, 0]) {
                rotate([0, 0, opening_cutter_rotation]) {
                    difference() {
                        dim = tolerance1*thickness;
                        cube([dim, dim, tolerance1*height], center = true);
                        translate([-thickness/2, 0, 0]) {
                            cylinder(h=tolerance1*height, r=thickness/2, center=true);
                        }
                    }
                }
            }
            // arc cutout
            scale(tolerance1)
            translate([0, 0, -height/2]) 
            linear_extrude(height)
            polygon(points=[
                [0,0],
                [opening_cutter_y, opening_cutter_x],
                [opening_cutter_y, tolerance1*outer_radius],
                [-opening_cutter_y, tolerance1*outer_radius],
                [-opening_cutter_y, opening_cutter_x]
            ]);
        }
        
        // holding tray with wedge for easy insertion of panel
        translate([-panel_holder_width/2, -(outer_radius+panel_holder_thickness-holder_thickness+(panel_thickness_bottom-panel_thickness)/2), -height/2])
        rotate([90, 0, 90])
        linear_extrude(panel_holder_width)
        polygon(points=[
            [0, 0],
            [panel_holder_thickness, 0],
            [panel_holder_thickness, panel_holder_height],
            [panel_holder_thickness-holder_thickness, panel_holder_height-2*holder_thickness],
            [panel_holder_thickness/2+panel_thickness_bottom/2, holder_thickness_bottom],
            [panel_holder_thickness/2-panel_thickness_bottom/2, holder_thickness_bottom],
            [holder_thickness, panel_holder_height-2*holder_thickness],
            [0, panel_holder_height]
        ]);
    }
}


drawRing();
